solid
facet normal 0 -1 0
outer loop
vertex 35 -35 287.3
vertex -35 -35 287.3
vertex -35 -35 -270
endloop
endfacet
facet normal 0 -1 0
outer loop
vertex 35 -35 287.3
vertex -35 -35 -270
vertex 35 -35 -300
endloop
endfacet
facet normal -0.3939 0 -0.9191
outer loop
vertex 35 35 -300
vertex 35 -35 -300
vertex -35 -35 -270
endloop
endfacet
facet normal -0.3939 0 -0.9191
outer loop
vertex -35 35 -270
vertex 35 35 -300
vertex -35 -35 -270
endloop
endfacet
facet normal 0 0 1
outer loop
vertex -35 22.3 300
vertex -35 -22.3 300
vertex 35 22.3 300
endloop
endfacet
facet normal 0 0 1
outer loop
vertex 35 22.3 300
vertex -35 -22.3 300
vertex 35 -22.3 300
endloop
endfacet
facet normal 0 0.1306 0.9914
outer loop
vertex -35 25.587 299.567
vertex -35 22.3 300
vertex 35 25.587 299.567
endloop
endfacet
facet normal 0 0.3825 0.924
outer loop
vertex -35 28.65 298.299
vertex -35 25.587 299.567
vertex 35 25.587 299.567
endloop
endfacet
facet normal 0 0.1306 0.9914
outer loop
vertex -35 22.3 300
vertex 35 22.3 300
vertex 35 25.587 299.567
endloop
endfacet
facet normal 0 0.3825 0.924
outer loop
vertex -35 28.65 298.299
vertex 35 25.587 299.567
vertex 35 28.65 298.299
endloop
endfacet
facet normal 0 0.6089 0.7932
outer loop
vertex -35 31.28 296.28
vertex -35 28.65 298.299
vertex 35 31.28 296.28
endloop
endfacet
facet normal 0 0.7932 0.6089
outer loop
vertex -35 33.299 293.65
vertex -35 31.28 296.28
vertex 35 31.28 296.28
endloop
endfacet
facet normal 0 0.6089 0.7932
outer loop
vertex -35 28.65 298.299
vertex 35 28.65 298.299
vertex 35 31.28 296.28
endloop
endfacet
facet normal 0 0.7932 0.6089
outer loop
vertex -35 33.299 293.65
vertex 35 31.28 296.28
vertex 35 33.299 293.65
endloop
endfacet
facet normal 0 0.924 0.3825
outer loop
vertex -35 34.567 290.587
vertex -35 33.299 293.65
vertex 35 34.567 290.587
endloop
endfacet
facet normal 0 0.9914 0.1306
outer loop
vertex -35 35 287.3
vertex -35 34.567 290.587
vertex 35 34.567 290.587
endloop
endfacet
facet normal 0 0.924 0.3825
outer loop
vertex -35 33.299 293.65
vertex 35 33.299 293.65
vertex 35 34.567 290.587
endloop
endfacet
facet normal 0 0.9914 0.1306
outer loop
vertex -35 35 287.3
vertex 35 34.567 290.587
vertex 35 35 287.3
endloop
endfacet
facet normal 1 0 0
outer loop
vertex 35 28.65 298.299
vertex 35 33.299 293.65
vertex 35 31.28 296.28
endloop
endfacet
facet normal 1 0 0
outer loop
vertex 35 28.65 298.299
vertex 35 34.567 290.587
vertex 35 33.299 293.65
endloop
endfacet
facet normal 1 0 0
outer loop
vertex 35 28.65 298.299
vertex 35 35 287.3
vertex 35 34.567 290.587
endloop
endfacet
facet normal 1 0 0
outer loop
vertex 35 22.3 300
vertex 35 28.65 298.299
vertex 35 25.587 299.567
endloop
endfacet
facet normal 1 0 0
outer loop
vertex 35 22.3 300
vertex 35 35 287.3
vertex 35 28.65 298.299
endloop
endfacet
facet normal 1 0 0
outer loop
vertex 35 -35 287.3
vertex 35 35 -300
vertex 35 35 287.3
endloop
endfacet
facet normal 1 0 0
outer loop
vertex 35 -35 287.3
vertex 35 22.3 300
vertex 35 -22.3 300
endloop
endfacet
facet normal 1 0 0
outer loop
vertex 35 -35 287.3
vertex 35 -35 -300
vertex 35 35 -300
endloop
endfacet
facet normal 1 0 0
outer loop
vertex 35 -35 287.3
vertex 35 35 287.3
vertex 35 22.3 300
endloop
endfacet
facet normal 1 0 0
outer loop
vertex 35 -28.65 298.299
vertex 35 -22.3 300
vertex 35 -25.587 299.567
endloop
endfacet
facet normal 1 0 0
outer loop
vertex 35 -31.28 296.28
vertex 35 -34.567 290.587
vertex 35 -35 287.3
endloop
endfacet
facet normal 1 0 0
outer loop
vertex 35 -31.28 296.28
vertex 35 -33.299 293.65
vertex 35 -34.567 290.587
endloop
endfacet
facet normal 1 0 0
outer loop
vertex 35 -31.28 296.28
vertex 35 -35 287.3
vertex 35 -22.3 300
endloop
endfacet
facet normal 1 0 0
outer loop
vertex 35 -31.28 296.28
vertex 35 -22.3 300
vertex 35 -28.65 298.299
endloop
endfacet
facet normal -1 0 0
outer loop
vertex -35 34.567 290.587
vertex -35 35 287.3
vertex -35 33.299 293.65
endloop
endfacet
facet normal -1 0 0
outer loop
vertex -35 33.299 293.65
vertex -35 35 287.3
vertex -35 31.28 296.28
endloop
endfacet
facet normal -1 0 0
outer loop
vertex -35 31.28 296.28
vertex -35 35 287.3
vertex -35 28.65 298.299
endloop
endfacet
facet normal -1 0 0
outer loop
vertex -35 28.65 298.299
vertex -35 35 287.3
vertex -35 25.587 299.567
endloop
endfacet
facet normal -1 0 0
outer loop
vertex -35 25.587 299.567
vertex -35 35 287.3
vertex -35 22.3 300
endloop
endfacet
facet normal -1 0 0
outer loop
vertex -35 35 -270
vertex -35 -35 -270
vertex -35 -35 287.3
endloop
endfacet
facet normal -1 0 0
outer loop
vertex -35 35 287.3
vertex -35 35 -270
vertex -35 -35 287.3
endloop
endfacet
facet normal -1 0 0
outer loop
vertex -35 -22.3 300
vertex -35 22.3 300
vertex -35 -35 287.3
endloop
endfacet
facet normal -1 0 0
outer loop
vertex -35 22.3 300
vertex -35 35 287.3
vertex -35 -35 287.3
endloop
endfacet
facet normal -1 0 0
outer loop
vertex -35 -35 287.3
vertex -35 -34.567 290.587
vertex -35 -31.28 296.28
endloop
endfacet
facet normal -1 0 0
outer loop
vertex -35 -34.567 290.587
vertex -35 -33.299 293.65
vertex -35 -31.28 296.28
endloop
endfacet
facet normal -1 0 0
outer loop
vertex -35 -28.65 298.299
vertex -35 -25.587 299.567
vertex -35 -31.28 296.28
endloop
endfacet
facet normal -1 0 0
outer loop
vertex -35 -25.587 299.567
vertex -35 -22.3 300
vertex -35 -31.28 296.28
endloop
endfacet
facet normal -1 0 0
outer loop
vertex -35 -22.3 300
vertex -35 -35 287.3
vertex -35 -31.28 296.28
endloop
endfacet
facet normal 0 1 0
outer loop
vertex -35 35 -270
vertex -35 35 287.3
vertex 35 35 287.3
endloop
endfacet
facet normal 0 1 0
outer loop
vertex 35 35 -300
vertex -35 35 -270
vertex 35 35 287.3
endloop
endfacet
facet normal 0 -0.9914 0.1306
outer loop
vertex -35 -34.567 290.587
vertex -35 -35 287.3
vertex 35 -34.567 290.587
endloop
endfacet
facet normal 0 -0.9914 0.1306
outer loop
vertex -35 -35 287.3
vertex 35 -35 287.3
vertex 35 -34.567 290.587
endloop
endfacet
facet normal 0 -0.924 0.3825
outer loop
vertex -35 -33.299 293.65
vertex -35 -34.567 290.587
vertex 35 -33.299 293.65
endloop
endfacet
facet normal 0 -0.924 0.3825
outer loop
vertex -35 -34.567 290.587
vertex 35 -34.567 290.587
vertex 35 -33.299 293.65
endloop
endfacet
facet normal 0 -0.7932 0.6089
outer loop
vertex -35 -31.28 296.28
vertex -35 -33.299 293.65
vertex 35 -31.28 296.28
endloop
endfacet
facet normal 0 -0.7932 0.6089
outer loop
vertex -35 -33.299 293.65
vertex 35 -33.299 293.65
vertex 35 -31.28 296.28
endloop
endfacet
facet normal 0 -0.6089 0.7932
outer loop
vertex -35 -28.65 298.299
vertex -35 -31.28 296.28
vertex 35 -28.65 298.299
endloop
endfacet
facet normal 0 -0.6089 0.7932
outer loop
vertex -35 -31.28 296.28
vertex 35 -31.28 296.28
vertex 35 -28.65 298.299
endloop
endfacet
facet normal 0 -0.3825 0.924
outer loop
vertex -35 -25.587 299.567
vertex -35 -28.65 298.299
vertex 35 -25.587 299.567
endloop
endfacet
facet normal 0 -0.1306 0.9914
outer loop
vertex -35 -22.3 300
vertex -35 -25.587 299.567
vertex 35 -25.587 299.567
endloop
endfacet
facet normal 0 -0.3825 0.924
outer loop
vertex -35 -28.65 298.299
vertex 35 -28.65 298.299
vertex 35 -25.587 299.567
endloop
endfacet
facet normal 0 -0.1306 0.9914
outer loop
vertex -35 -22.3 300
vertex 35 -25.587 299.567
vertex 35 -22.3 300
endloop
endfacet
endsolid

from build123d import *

# Parameters (mm, degrees)
F0_W     = 70
F0_H     = 600
F1_DEPTH = 35
F2_R     = 12.7
F4_DEPTH = 72.39


with BuildPart() as f1:
    # F0 (on Front) → F1 (new body, symmetric)
    with BuildSketch(Plane.XZ):
        Rectangle(F0_W, F0_H)
    extrude(amount=F1_DEPTH, both=True)

    # F2
    f2_edges = [f1.edges().sort_by_distance(p)[0] for p in [
        (0, -35, 300),
        (0, 35, 300),
    ]]
    fillet(f2_edges, radius=F2_R)

    # F3 (on face) → F4 (cut, symmetric)
    with BuildSketch(Plane.XZ.offset(35)):
        Polygon((35, -300), (-35, -270), (-35, -300), align=None)
    extrude(amount=F4_DEPTH, both=True, mode=Mode.SUBTRACT)


solid = f1.part
